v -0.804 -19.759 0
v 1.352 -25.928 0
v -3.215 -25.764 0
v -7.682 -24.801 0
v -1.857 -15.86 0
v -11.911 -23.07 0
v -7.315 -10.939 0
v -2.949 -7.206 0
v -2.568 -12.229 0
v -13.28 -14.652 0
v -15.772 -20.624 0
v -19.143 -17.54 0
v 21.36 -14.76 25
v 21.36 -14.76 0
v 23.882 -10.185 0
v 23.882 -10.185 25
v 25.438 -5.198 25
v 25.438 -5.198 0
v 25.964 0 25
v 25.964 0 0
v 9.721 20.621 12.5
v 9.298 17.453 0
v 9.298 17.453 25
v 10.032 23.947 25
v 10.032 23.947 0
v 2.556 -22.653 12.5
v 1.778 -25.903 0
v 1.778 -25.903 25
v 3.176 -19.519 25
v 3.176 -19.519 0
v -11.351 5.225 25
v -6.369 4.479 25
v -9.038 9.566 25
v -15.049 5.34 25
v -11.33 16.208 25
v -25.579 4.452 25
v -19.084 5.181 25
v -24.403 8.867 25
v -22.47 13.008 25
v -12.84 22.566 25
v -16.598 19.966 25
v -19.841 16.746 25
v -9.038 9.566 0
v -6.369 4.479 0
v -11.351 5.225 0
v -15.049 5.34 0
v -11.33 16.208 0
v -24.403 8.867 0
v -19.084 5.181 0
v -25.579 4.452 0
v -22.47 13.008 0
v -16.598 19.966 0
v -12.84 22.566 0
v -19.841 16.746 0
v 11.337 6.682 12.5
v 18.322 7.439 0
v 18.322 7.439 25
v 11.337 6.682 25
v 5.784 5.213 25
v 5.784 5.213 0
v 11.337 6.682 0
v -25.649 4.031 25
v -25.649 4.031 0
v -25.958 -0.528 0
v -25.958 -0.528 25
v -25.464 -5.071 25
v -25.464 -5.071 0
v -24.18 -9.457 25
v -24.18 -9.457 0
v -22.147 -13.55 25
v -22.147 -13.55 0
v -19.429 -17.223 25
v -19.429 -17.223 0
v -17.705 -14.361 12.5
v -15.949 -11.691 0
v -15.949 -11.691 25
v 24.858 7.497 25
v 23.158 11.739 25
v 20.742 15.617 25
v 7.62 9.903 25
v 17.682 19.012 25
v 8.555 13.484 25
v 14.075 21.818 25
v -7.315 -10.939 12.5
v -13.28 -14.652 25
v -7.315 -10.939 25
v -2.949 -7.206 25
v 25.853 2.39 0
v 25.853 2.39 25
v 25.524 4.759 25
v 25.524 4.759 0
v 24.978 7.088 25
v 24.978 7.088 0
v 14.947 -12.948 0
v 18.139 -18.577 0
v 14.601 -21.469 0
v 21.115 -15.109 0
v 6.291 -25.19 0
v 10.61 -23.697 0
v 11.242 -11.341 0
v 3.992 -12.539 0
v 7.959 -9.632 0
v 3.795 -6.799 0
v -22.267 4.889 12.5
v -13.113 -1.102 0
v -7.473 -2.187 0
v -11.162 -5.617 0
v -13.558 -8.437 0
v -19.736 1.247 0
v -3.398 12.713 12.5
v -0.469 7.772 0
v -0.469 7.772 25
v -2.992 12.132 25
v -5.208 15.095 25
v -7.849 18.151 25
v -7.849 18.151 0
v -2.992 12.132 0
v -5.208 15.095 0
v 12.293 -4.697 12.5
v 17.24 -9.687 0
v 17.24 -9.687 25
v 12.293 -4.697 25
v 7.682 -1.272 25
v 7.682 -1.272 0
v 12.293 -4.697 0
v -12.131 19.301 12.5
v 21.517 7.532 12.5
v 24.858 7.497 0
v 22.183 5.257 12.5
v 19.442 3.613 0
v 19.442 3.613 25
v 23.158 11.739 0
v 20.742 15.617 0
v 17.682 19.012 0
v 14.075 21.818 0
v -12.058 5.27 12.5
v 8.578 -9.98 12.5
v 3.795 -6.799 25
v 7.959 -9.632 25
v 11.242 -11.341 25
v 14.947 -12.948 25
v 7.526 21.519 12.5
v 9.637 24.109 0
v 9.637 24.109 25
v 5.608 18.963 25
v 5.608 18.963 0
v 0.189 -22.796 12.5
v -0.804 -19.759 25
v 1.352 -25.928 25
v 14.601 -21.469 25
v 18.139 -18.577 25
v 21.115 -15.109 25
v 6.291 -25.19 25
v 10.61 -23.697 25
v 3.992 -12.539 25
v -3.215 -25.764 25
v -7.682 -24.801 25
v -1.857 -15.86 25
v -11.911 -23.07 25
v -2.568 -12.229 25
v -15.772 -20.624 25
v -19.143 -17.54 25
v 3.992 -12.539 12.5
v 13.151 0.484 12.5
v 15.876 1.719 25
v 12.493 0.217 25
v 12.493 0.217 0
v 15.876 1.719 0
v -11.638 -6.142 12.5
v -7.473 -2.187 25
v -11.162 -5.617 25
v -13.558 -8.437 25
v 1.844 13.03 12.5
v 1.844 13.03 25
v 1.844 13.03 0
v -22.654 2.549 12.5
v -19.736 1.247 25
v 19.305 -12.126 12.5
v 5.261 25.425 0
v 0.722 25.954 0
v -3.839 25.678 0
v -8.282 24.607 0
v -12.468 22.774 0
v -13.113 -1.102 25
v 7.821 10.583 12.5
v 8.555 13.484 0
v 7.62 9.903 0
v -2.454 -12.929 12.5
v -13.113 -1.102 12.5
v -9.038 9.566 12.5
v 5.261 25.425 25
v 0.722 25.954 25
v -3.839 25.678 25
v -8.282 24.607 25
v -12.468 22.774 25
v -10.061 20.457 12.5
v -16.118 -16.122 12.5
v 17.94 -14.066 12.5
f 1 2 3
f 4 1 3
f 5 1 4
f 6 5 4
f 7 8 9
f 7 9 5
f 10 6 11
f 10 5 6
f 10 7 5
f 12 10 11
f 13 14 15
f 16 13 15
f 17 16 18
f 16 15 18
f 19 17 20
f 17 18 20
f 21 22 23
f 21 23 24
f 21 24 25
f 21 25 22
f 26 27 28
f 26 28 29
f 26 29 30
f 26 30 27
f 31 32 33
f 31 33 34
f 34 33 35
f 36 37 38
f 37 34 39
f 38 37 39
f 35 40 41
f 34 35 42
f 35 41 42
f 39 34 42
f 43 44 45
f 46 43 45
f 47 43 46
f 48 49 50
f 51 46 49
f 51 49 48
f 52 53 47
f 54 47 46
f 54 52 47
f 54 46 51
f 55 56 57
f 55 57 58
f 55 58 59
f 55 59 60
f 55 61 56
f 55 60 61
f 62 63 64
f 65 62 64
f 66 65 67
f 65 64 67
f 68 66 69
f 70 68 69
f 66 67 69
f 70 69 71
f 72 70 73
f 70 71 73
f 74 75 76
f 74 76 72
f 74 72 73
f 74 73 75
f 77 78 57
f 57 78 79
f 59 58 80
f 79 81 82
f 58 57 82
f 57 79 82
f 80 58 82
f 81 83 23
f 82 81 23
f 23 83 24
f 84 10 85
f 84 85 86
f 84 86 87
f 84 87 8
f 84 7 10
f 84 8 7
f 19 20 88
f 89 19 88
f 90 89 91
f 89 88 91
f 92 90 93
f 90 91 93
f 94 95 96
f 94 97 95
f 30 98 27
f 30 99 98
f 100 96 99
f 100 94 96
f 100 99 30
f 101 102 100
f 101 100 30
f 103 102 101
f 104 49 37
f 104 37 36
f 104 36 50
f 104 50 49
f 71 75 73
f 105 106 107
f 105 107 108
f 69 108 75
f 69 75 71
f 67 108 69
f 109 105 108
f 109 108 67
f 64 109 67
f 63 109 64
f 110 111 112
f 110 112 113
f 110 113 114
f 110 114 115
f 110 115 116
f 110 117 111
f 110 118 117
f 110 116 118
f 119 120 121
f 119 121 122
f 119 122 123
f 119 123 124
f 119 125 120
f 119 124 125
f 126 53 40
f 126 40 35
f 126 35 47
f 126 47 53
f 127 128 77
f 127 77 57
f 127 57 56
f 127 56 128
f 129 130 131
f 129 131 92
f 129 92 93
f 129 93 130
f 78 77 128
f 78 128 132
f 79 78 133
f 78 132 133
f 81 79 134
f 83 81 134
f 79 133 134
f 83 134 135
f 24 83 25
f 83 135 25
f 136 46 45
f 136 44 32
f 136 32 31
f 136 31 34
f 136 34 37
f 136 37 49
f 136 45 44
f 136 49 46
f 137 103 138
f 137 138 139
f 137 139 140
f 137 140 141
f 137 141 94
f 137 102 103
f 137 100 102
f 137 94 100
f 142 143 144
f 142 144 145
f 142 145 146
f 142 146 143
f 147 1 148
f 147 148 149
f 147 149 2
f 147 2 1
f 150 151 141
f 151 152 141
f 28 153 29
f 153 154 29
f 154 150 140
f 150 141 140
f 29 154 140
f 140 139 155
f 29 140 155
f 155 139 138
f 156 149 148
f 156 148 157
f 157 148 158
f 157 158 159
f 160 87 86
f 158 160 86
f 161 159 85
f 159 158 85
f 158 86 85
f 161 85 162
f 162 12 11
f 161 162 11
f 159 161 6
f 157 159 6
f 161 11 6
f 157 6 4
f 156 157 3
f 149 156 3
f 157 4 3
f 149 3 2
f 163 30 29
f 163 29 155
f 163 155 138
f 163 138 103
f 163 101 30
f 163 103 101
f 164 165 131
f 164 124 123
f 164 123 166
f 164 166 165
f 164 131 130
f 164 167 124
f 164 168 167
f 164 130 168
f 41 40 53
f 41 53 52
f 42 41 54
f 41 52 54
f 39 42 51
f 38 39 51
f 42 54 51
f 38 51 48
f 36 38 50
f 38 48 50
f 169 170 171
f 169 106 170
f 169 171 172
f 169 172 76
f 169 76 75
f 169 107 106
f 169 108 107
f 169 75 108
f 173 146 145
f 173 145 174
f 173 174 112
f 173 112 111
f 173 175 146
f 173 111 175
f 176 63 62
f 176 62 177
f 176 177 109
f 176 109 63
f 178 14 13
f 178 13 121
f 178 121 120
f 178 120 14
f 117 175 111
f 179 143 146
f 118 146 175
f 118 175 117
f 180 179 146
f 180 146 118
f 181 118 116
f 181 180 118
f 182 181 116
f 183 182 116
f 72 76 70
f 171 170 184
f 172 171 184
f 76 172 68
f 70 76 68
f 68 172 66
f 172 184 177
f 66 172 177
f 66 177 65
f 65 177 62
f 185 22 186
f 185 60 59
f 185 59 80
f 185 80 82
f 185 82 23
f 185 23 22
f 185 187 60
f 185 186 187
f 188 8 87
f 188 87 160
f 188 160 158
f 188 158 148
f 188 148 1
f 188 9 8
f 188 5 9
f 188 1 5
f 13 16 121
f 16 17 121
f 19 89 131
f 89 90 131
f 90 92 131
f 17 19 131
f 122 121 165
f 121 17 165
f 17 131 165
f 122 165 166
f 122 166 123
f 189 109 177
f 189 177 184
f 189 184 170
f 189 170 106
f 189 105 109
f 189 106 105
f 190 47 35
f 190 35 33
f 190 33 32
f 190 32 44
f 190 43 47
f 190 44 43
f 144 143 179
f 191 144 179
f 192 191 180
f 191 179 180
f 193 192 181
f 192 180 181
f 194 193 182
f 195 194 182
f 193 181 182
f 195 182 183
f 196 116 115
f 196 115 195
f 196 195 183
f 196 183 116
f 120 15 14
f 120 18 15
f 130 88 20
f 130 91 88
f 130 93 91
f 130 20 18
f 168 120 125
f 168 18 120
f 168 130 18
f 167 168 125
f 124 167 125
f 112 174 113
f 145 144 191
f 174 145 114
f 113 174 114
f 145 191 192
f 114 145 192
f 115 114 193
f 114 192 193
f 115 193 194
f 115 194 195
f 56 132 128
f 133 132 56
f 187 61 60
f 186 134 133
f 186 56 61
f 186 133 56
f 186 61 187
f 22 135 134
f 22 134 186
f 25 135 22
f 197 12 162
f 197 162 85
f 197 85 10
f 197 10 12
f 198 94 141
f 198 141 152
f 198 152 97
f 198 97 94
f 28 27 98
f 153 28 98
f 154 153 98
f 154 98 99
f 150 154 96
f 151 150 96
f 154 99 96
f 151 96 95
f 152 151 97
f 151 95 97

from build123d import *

# Parameters (mm, degrees)
F1_DEPTH = 25


# Not quite as in the source:
# - the program builds the solid bodies; features that only make, move or delete a surface that nothing else refers to are left out


with BuildPart() as f1:
    # F0 (on Top) → F1 (new body)
    with BuildSketch(Plane.XY):
        with BuildLine():
            add(Edge.make_bspline(
                [(-0.4692695513, 7.7720791406), (-2.6156286588, 12.4580584803), (-7.8485191875, 18.1509645982)],
                knots=[0.5135743426, 0.5135743426, 0.5135743426, 0.9861102341, 0.9861102341, 0.9861102341], degree=2, weights=[1, 0.9722183274, 1]))
            add(Edge.make_bspline(
                [(5.6075930615, 18.9634297884), (1.0976837537, 12.682264181), (-0.4692695513, 7.7720791406)],
                knots=[5.2970750731, 5.2970750731, 5.2970750731, 5.7696109645, 5.7696109645, 5.7696109645], degree=2, weights=[1, 0.9722183274, 1]))
            ThreePointArc((5.6075930615, 18.9634297884), (-1.1918315304, 19.739207352), (-7.8485191875, 18.1509645982))
        make_face()
        with BuildLine():
            add(Edge.make_bspline(
                [(-7.8485191875, 18.1509645982), (-9.963024287, 20.4513526823), (-12.4679324412, 22.774157764)],
                knots=[0.9861102341, 0.9861102341, 0.9861102341, 1.1800761223, 1.1800761223, 1.1800761223], degree=2, weights=[1, 0.9953008392, 1]))
            ThreePointArc((-7.8485191875, 18.1509645982), (-1.1918315304, 19.739207352), (5.6075930615, 18.9634297884))
            add(Edge.make_bspline(
                [(9.6371888027, 24.1088405611), (7.4299560897, 21.5015216202), (5.6075930615, 18.9634297884)],
                knots=[5.1031091849, 5.1031091849, 5.1031091849, 5.2970750731, 5.2970750731, 5.2970750731], degree=2, weights=[1, 0.9953008392, 1]))
            ThreePointArc((9.6371888027, 24.1088405611), (-1.5648073137, 25.9164615503), (-12.4679324412, 22.774157764))
        make_face()
    extrude(amount=F1_DEPTH)


with BuildPart() as f1b:
    # F0 (on Top) → F1, piece 2 (new body)
    with BuildSketch(Plane.XY):
        with BuildLine():
            add(Edge.make_bspline(
                [(5.7838713768, 5.2127017923), (8.1092845361, 9.8124532453), (9.297523887, 17.4531607124)],
                knots=[0.5135743426, 0.5135743426, 0.5135743426, 0.9861102341, 0.9861102341, 0.9861102341], degree=2, weights=[1, 0.9722183274, 1]))
            add(Edge.make_bspline(
                [(18.322483511, 7.4393122849), (10.5997880318, 7.0490586649), (5.7838713768, 5.2127017923)],
                knots=[5.2970750731, 5.2970750731, 5.2970750731, 5.7696109645, 5.7696109645, 5.7696109645], degree=2, weights=[1, 0.9722183274, 1]))
            ThreePointArc((18.322483511, 7.4393122849), (14.689638942, 13.239005893), (9.297523887, 17.4531607124))
        make_face()
        with BuildLine():
            ThreePointArc((9.297523887, 17.4531607124), (14.689638942, 13.239005893), (18.322483511, 7.4393122849))
            add(Edge.make_bspline(
                [(24.8577394935, 7.496958616), (21.4430683738, 7.5970058703), (18.322483511, 7.4393122849)],
                knots=[5.1031091849, 5.1031091849, 5.1031091849, 5.2970750731, 5.2970750731, 5.2970750731], degree=2, weights=[1, 0.9953008392, 1]))
            ThreePointArc((24.8577394935, 7.496958616), (19.2866641523, 17.3820650987), (10.0319247992, 23.9472772156))
            add(Edge.make_bspline(
                [(9.297523887, 17.4531607124), (9.7776673475, 20.5406158798), (10.0319247992, 23.9472772156)],
                knots=[0.9861102341, 0.9861102341, 0.9861102341, 1.1800761223, 1.1800761223, 1.1800761223], degree=2, weights=[1, 0.9953008392, 1]))
        make_face()
    extrude(amount=F1_DEPTH)


with BuildPart() as f1c:
    # F0 (on Top) → F1, piece 3 (new body)
    with BuildSketch(Plane.XY):
        with BuildLine():
            add(Edge.make_bspline(
                [(-7.472794591, -2.186954293), (-11.563676812, -5.3222281957), (-15.9494222001, -11.6907100198)],
                knots=[0.5135743426, 0.5135743426, 0.5135743426, 0.9861102341, 0.9861102341, 0.9861102341], degree=2, weights=[1, 0.9722183274, 1]))
            add(Edge.make_bspline(
                [(-19.7357838567, 1.2472388883), (-12.6085509538, -1.75190674), (-7.472794591, -2.186954293)],
                knots=[5.2970750731, 5.2970750731, 5.2970750731, 5.7696109645, 5.7696109645, 5.7696109645], degree=2, weights=[1, 0.9722183274, 1]))
            ThreePointArc((-19.7357838567, 1.2472388883), (-18.9790967465, -5.5543366811), (-15.9494222001, -11.6907100198))
        make_face()
        with BuildLine():
            ThreePointArc((-15.9494222001, -11.6907100198), (-18.9790967465, -5.5543366811), (-19.7357838567, 1.2472388883))
            add(Edge.make_bspline(
                [(-25.6488578464, 4.0308426405), (-22.6157543502, 2.4591329057), (-19.7357838567, 1.2472388883)],
                knots=[5.1031091849, 5.1031091849, 5.1031091849, 5.2970750731, 5.2970750731, 5.2970750731], degree=2, weights=[1, 0.9953008392, 1]))
            ThreePointArc((-25.6488578464, 4.0308426405), (-24.9184793655, -7.2925295563), (-19.4287861092, -17.2230621999))
            add(Edge.make_bspline(
                [(-15.9494222001, -11.6907100198), (-17.7216131025, -14.2640845666), (-19.4287861092, -17.2230621999)],
                knots=[0.9861102341, 0.9861102341, 0.9861102341, 1.1800761223, 1.1800761223, 1.1800761223], degree=2, weights=[1, 0.9953008392, 1]))
        make_face()
    extrude(amount=F1_DEPTH)


with BuildPart() as f1d:
    # F0 (on Top) → F1, piece 4 (new body)
    with BuildSketch(Plane.XY):
        with BuildLine():
            add(Edge.make_bspline(
                [(-2.9493815019, -7.2060097721), (-3.048749004, -12.3592015879), (-0.8041369414, -19.758798877)],
                knots=[0.5135743426, 0.5135743426, 0.5135743426, 0.9861102341, 0.9861102341, 0.9861102341], degree=2, weights=[1, 0.9722183274, 1]))
            add(Edge.make_bspline(
                [(-13.2801905954, -14.652416423), (-6.4916070922, -10.9500580702), (-2.9493815019, -7.2060097721)],
                knots=[5.2970750731, 5.2970750731, 5.2970750731, 5.7696109645, 5.7696109645, 5.7696109645], degree=2, weights=[1, 0.9722183274, 1]))
            ThreePointArc((-13.2801905954, -14.652416423), (-7.4907179885, -18.301527622), (-0.8041369414, -19.758798877))
        make_face()
        with BuildLine():
            ThreePointArc((-0.8041369414, -19.758798877), (-7.4907179885, -18.301527622), (-13.2801905954, -14.652416423))
            add(Edge.make_bspline(
                [(-19.1432409738, -17.5398952745), (-16.023319724, -16.1484644626), (-13.2801905954, -14.652416423)],
                knots=[5.1031091849, 5.1031091849, 5.1031091849, 5.2970750731, 5.2970750731, 5.2970750731], degree=2, weights=[1, 0.9953008392, 1]))
            ThreePointArc((-19.1432409738, -17.5398952745), (-9.8348885682, -24.0288694713), (1.3518822508, -25.9284402847))
            add(Edge.make_bspline(
                [(-0.8041369414, -19.758798877), (0.1028653409, -22.7488263038), (1.3518822508, -25.9284402847)],
                knots=[0.9861102341, 0.9861102341, 0.9861102341, 1.1800761223, 1.1800761223, 1.1800761223], degree=2, weights=[1, 0.9953008392, 1]))
        make_face()
    extrude(amount=F1_DEPTH)


with BuildPart() as f1e:
    # F0 (on Top) → F1, piece 5 (new body)
    with BuildSketch(Plane.XY):
        with BuildLine():
            add(Edge.make_bspline(
                [(-6.3690409359, 4.4789223745), (-11.3709201246, 5.7224915816), (-19.0844672331, 5.1807219294)],
                knots=[0.5135743426, 0.5135743426, 0.5135743426, 0.9861102341, 0.9861102341, 0.9861102341], degree=2, weights=[1, 0.9722183274, 1]))
            add(Edge.make_bspline(
                [(-11.3299293373, 16.2076978777), (-9.2309987796, 8.7654660978), (-6.3690409359, 4.4789223745)],
                knots=[5.2970750731, 5.2970750731, 5.2970750731, 5.7696109645, 5.7696109645, 5.7696109645], degree=2, weights=[1, 0.9722183274, 1]))
            ThreePointArc((-11.3299293373, 16.2076978777), (-16.1758285515, 11.3753830685), (-19.0844672331, 5.1807219294))
        make_face()
        with BuildLine():
            add(Edge.make_bspline(
                [(-19.0844672331, 5.1807219294), (-22.2013554247, 4.9618037835), (-25.579182254, 4.4516330079)],
                knots=[0.9861102341, 0.9861102341, 0.9861102341, 1.1800761223, 1.1800761223, 1.1800761223], degree=2, weights=[1, 0.9953008392, 1]))
            ThreePointArc((-19.0844672331, 5.1807219294), (-16.1758285515, 11.3753830685), (-11.3299293373, 16.2076978777))
            add(Edge.make_bspline(
                [(-12.8403616194, 22.5662738329), (-12.1780646734, 19.2149530389), (-11.3299293373, 16.2076978777)],
                knots=[5.1031091849, 5.1031091849, 5.1031091849, 5.2970750731, 5.2970750731, 5.2970750731], degree=2, weights=[1, 0.9953008392, 1]))
            ThreePointArc((-12.8403616194, 22.5662738329), (-21.2379469562, 14.935233855), (-25.579182254, 4.4516330079))
        make_face()
    extrude(amount=F1_DEPTH)


with BuildPart() as f1f:
    # F0 (on Top) → F1, piece 6 (new body)
    with BuildSketch(Plane.XY):
        with BuildLine():
            add(Edge.make_bspline(
                [(3.7949760146, -6.798792917), (7.7619489872, -10.0894441027), (14.9466798355, -12.9481091738)],
                knots=[0.5135743426, 0.5135743426, 0.5135743426, 0.9861102341, 0.9861102341, 0.9861102341], degree=2, weights=[1, 0.9722183274, 1]))
            add(Edge.make_bspline(
                [(3.1756570507, -19.518503313), (4.5136493145, -11.902592333), (3.7949760146, -6.798792917)],
                knots=[5.2970750731, 5.2970750731, 5.2970750731, 5.7696109645, 5.7696109645, 5.7696109645], degree=2, weights=[1, 0.9722183274, 1]))
            ThreePointArc((3.1756570507, -19.518503313), (9.6383241977, -17.2672949804), (14.9466798355, -12.9481091738))
        make_face()
        with BuildLine():
            ThreePointArc((14.9466798355, -12.9481091738), (9.6383241977, -17.2672949804), (3.1756570507, -19.518503313))
            add(Edge.make_bspline(
                [(1.7776268031, -25.9027342991), (2.6350014706, -22.595938722), (3.1756570507, -19.518503313)],
                knots=[5.1031091849, 5.1031091849, 5.1031091849, 5.2970750731, 5.2970750731, 5.2970750731], degree=2, weights=[1, 0.9953008392, 1]))
            ThreePointArc((1.7776268031, -25.9027342991), (12.6545739161, -22.6709805748), (21.1145557026, -15.1091739914))
            add(Edge.make_bspline(
                [(14.9466798355, -12.9481091738), (17.8498840845, -14.1032378427), (21.1145557026, -15.1091739914)],
                knots=[0.9861102341, 0.9861102341, 0.9861102341, 1.1800761223, 1.1800761223, 1.1800761223], degree=2, weights=[1, 0.9953008392, 1]))
        make_face()
    extrude(amount=F1_DEPTH)


with BuildPart() as f1g:
    # F0 (on Top) → F1, piece 7 (new body)
    with BuildSketch(Plane.XY):
        with BuildLine():
            add(Edge.make_bspline(
                [(7.6816391887, -1.2719463253), (12.7277410761, -0.222129421), (19.4423418396, 3.6127708305)],
                knots=[0.5135743426, 0.5135743426, 0.5135743426, 0.9861102341, 0.9861102341, 0.9861102341], degree=2, weights=[1, 0.9722183274, 1]))
            add(Edge.make_bspline(
                [(17.2401701661, -9.6867591034), (12.1200357257, -3.8922318004), (7.6816391887, -1.2719463253)],
                knots=[5.2970750731, 5.2970750731, 5.2970750731, 5.7696109645, 5.7696109645, 5.7696109645], degree=2, weights=[1, 0.9722183274, 1]))
            ThreePointArc((17.2401701661, -9.6867591034), (19.1309149369, -5.006482094), (19.7751553542, 0))
            ThreePointArc((19.7751553542, 0), (19.6917761973, 1.8140340342), (19.4423418396, 3.6127708305))
        make_face()
        with BuildLine():
            ThreePointArc((19.7751553542, 0), (19.1309149369, -5.006482094), (17.2401701661, -9.6867591034))
            add(Edge.make_bspline(
                [(21.3599053403, -14.760286077), (19.3091128136, -12.0282102505), (17.2401701661, -9.6867591034)],
                knots=[5.1031091849, 5.1031091849, 5.1031091849, 5.2970750731, 5.2970750731, 5.2970750731], degree=2, weights=[1, 0.9953008392, 1]))
            ThreePointArc((21.3599053403, -14.760286077), (24.7860132424, -7.7307922469), (25.9636592417, 0))
            ThreePointArc((25.9636592417, 0), (25.7159472691, 3.5779403673), (24.9775380519, 7.0876084884))
            add(Edge.make_bspline(
                [(19.4423418396, 3.6127708305), (22.1555760412, 5.1623763676), (24.9775380519, 7.0876084884)],
                knots=[0.9861102341, 0.9861102341, 0.9861102341, 1.1800761223, 1.1800761223, 1.1800761223], degree=2, weights=[1, 0.9953008392, 1]))
            ThreePointArc((19.4423418396, 3.6127708305), (19.6917761973, 1.8140340342), (19.7751553542, 0))
        make_face()
    extrude(amount=F1_DEPTH)


solid = Compound([f1.part, f1b.part, f1c.part, f1d.part, f1e.part, f1f.part, f1g.part])
